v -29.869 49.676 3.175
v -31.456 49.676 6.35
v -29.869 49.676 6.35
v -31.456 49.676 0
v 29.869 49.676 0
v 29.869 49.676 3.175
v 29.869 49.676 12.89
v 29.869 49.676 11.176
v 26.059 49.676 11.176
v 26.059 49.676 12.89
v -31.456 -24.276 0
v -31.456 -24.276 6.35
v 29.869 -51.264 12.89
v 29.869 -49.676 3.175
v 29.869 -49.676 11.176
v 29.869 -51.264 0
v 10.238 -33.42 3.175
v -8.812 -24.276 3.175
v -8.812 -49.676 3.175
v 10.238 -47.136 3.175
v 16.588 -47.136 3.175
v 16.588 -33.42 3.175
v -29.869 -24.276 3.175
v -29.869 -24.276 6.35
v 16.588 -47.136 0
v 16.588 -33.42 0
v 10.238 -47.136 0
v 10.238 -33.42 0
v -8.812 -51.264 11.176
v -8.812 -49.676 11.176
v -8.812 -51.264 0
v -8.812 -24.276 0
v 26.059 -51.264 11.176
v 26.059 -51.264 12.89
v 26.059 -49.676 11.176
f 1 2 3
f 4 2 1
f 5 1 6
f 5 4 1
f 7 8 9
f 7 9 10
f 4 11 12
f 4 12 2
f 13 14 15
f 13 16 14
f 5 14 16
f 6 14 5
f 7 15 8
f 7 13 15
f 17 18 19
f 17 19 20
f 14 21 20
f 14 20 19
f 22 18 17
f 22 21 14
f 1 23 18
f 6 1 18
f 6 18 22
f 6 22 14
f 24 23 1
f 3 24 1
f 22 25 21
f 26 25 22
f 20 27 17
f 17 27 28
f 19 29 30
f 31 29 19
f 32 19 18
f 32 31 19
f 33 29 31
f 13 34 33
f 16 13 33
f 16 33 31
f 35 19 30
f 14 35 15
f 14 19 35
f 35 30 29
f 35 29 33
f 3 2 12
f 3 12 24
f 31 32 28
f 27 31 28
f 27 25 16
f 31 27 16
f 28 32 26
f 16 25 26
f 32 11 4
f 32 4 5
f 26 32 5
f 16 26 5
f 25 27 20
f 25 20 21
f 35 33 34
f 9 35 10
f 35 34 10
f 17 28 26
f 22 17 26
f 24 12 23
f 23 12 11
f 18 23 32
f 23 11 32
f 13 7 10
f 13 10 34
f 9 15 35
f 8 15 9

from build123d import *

# Parameters (mm, degrees)
F0_W     = 6.35
F0_H     = 13.716
F1_DEPTH = 3.175
F0_W_2   = 1.5875
F0_H_2   = 73.952875
F2_DEPTH = 6.35
F0_W_3   = 38.6812536
F0_H_3   = 1.5875
F3_DEPTH = 11.176
F7_DEPTH = 3.81


# Not quite as in the source:
# - a feature names something its author has since deleted; it is built from what else it names


with BuildPart() as f1:
    # F0 (on Top) → F1 (new body)
    with BuildSketch(Plane.XY):
        Polygon((29.8689268, -49.6764375), (29.8689268, 49.6764375), (-29.8689268, 49.6764375), (-29.8689268, -24.2764375), (-8.8123268, -24.2764375), (-8.8123268, -49.6764375), align=None)
        with Locations((13.4126732, -40.2784375)):
            Rectangle(F0_W, F0_H, mode=Mode.SUBTRACT)
    extrude(amount=F1_DEPTH)

    # F0 (on Top) → F2 (join)
    with BuildSketch(Plane.XY):
        with Locations((-30.6626768, 12.7)):
            Rectangle(F0_W_2, F0_H_2)
    extrude(amount=F2_DEPTH)

    # F0 (on Top) → F3 (join)
    with BuildSketch(Plane.XY):
        with Locations((10.5283, -50.4701875)):
            Rectangle(F0_W_3, F0_H_3)
    extrude(amount=F3_DEPTH)

    # F6 (on face) → F7 (join)
    with BuildSketch(Plane.YZ.offset(29.8689268)):
        Polygon((-51.2639375, 12.8905), (-51.2639375, 11.176), (-49.6764375, 11.176), (49.6764375, 11.176), (49.6764375, 12.8905), align=None)
    extrude(amount=-F7_DEPTH)


solid = f1.part
